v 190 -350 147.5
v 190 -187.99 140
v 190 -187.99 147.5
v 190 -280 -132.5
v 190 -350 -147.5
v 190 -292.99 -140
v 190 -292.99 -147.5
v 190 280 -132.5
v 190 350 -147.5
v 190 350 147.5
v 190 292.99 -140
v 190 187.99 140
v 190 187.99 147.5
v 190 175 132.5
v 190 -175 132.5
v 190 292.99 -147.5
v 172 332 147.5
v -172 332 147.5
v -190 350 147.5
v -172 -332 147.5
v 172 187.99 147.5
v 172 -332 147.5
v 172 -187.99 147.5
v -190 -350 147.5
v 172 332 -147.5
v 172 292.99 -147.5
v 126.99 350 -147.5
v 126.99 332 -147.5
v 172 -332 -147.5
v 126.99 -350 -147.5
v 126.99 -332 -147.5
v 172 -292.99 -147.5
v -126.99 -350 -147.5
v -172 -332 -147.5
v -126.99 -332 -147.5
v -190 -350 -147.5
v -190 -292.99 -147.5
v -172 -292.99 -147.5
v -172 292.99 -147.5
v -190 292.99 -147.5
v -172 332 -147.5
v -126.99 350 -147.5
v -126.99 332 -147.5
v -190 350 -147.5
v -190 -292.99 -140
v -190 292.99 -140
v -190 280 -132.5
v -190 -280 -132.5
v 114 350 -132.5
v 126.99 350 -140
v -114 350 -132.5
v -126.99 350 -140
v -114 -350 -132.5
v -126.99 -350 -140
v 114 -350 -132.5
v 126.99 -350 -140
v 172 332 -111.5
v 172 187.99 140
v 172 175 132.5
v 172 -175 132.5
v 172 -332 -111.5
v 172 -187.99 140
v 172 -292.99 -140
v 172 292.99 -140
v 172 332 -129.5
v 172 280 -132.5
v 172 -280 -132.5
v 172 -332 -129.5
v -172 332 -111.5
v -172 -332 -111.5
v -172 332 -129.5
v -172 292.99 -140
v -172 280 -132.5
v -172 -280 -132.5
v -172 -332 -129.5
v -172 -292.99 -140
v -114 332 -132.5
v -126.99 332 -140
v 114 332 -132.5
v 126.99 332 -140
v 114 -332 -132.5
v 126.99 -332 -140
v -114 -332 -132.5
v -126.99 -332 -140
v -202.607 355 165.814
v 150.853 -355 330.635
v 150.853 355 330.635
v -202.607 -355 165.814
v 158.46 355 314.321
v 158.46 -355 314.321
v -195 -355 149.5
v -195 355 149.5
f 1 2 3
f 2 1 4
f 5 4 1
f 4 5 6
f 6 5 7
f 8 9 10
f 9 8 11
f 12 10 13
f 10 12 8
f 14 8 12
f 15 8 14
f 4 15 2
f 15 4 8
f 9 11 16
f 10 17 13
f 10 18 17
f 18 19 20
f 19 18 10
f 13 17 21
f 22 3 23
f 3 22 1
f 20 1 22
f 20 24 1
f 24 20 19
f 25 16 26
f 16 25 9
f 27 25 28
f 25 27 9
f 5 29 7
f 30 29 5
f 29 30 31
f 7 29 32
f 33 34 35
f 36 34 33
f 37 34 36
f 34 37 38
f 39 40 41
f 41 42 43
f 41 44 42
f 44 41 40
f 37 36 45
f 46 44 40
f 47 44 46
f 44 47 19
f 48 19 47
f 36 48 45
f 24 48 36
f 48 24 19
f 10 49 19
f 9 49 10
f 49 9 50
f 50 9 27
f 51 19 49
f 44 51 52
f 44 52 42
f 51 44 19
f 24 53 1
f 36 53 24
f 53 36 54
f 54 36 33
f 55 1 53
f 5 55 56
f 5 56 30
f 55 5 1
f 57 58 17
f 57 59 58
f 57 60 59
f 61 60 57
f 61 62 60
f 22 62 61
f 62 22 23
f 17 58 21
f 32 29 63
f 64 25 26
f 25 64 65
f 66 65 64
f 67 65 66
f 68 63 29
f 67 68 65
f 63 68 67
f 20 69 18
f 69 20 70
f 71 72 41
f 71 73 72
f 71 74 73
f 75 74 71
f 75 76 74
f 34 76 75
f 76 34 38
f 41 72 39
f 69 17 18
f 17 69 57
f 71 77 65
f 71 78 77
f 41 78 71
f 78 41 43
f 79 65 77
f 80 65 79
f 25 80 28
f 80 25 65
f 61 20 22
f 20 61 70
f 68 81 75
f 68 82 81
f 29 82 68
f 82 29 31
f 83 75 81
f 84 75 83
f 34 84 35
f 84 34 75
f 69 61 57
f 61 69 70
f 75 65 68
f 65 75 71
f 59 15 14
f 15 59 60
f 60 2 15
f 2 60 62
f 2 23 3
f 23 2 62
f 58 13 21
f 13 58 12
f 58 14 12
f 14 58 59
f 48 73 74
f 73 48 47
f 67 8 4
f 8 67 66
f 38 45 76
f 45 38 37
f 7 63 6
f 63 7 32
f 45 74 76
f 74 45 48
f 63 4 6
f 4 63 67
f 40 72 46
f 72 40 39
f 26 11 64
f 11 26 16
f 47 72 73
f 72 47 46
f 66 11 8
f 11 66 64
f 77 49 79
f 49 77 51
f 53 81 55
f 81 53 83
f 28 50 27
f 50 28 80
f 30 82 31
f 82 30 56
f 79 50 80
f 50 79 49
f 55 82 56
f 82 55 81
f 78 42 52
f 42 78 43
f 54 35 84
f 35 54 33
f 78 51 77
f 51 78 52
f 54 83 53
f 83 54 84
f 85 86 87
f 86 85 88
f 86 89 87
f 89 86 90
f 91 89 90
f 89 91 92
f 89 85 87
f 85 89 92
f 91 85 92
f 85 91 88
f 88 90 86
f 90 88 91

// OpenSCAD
/* 

d=400
l=735

høyre del hylle
h=245

venstre hylle
h=300

*/

d=380;
l=700;

h=295;

t_mat=18;

module lid(lip, open){
    translate([0,0,h/2+t_mat/2+2]){
    
    translate([-(d+lip)/2,-(l+lip)/2,-t_mat/2]){
        rotate([0,-open,0]){
        cube([d+lip,l+lip,t_mat],center=false);
        }
    }
    }
}

module body(){
    //color("BurlyWood") {
    difference([]){
    cube([d,l,h],center=true);

    cube([d-2*t_mat,l-2*t_mat,h+2],center=true);
    
    }
    
    // bottom
    translate([0,0,-h/2+1.5*t_mat]){
    cube([d-2*t_mat,l-2*t_mat,t_mat],center=true);    
    }
    //}
}

module lip(width, depth)
{
    cyl_faces=6;
    cyl_r = 30/2;
    
    translate([(d-t_mat/2)/2,0,0]){
    cube([depth,width,30], center=true);
        
    translate([0,-width/2,0]){
    rotate([0,90,0]){
    cylinder($fn = cyl_faces, h = depth, r = cyl_r, center = true);
    }
    }
    
    translate([0,width/2,0]){
    rotate([0,90,0]){
    cylinder($fn = cyl_faces, h = depth, r = cyl_r, center = true);
    }
    }
    
    }
}

lid_angle=25;
lid(10, lid_angle);

difference(){
body();

// handle
translate([0,0,h/2]){
    lip(l/2, t_mat*2);
}

// lower legs long side
translate([0,0,-h/2]){
    lip(l*8/10, 2*d);
}

//lower legs short side
rotate([0,0,90]){
translate([0,0,-h/2]){
    lip(d*6/10, 3*l);
}
}

}
